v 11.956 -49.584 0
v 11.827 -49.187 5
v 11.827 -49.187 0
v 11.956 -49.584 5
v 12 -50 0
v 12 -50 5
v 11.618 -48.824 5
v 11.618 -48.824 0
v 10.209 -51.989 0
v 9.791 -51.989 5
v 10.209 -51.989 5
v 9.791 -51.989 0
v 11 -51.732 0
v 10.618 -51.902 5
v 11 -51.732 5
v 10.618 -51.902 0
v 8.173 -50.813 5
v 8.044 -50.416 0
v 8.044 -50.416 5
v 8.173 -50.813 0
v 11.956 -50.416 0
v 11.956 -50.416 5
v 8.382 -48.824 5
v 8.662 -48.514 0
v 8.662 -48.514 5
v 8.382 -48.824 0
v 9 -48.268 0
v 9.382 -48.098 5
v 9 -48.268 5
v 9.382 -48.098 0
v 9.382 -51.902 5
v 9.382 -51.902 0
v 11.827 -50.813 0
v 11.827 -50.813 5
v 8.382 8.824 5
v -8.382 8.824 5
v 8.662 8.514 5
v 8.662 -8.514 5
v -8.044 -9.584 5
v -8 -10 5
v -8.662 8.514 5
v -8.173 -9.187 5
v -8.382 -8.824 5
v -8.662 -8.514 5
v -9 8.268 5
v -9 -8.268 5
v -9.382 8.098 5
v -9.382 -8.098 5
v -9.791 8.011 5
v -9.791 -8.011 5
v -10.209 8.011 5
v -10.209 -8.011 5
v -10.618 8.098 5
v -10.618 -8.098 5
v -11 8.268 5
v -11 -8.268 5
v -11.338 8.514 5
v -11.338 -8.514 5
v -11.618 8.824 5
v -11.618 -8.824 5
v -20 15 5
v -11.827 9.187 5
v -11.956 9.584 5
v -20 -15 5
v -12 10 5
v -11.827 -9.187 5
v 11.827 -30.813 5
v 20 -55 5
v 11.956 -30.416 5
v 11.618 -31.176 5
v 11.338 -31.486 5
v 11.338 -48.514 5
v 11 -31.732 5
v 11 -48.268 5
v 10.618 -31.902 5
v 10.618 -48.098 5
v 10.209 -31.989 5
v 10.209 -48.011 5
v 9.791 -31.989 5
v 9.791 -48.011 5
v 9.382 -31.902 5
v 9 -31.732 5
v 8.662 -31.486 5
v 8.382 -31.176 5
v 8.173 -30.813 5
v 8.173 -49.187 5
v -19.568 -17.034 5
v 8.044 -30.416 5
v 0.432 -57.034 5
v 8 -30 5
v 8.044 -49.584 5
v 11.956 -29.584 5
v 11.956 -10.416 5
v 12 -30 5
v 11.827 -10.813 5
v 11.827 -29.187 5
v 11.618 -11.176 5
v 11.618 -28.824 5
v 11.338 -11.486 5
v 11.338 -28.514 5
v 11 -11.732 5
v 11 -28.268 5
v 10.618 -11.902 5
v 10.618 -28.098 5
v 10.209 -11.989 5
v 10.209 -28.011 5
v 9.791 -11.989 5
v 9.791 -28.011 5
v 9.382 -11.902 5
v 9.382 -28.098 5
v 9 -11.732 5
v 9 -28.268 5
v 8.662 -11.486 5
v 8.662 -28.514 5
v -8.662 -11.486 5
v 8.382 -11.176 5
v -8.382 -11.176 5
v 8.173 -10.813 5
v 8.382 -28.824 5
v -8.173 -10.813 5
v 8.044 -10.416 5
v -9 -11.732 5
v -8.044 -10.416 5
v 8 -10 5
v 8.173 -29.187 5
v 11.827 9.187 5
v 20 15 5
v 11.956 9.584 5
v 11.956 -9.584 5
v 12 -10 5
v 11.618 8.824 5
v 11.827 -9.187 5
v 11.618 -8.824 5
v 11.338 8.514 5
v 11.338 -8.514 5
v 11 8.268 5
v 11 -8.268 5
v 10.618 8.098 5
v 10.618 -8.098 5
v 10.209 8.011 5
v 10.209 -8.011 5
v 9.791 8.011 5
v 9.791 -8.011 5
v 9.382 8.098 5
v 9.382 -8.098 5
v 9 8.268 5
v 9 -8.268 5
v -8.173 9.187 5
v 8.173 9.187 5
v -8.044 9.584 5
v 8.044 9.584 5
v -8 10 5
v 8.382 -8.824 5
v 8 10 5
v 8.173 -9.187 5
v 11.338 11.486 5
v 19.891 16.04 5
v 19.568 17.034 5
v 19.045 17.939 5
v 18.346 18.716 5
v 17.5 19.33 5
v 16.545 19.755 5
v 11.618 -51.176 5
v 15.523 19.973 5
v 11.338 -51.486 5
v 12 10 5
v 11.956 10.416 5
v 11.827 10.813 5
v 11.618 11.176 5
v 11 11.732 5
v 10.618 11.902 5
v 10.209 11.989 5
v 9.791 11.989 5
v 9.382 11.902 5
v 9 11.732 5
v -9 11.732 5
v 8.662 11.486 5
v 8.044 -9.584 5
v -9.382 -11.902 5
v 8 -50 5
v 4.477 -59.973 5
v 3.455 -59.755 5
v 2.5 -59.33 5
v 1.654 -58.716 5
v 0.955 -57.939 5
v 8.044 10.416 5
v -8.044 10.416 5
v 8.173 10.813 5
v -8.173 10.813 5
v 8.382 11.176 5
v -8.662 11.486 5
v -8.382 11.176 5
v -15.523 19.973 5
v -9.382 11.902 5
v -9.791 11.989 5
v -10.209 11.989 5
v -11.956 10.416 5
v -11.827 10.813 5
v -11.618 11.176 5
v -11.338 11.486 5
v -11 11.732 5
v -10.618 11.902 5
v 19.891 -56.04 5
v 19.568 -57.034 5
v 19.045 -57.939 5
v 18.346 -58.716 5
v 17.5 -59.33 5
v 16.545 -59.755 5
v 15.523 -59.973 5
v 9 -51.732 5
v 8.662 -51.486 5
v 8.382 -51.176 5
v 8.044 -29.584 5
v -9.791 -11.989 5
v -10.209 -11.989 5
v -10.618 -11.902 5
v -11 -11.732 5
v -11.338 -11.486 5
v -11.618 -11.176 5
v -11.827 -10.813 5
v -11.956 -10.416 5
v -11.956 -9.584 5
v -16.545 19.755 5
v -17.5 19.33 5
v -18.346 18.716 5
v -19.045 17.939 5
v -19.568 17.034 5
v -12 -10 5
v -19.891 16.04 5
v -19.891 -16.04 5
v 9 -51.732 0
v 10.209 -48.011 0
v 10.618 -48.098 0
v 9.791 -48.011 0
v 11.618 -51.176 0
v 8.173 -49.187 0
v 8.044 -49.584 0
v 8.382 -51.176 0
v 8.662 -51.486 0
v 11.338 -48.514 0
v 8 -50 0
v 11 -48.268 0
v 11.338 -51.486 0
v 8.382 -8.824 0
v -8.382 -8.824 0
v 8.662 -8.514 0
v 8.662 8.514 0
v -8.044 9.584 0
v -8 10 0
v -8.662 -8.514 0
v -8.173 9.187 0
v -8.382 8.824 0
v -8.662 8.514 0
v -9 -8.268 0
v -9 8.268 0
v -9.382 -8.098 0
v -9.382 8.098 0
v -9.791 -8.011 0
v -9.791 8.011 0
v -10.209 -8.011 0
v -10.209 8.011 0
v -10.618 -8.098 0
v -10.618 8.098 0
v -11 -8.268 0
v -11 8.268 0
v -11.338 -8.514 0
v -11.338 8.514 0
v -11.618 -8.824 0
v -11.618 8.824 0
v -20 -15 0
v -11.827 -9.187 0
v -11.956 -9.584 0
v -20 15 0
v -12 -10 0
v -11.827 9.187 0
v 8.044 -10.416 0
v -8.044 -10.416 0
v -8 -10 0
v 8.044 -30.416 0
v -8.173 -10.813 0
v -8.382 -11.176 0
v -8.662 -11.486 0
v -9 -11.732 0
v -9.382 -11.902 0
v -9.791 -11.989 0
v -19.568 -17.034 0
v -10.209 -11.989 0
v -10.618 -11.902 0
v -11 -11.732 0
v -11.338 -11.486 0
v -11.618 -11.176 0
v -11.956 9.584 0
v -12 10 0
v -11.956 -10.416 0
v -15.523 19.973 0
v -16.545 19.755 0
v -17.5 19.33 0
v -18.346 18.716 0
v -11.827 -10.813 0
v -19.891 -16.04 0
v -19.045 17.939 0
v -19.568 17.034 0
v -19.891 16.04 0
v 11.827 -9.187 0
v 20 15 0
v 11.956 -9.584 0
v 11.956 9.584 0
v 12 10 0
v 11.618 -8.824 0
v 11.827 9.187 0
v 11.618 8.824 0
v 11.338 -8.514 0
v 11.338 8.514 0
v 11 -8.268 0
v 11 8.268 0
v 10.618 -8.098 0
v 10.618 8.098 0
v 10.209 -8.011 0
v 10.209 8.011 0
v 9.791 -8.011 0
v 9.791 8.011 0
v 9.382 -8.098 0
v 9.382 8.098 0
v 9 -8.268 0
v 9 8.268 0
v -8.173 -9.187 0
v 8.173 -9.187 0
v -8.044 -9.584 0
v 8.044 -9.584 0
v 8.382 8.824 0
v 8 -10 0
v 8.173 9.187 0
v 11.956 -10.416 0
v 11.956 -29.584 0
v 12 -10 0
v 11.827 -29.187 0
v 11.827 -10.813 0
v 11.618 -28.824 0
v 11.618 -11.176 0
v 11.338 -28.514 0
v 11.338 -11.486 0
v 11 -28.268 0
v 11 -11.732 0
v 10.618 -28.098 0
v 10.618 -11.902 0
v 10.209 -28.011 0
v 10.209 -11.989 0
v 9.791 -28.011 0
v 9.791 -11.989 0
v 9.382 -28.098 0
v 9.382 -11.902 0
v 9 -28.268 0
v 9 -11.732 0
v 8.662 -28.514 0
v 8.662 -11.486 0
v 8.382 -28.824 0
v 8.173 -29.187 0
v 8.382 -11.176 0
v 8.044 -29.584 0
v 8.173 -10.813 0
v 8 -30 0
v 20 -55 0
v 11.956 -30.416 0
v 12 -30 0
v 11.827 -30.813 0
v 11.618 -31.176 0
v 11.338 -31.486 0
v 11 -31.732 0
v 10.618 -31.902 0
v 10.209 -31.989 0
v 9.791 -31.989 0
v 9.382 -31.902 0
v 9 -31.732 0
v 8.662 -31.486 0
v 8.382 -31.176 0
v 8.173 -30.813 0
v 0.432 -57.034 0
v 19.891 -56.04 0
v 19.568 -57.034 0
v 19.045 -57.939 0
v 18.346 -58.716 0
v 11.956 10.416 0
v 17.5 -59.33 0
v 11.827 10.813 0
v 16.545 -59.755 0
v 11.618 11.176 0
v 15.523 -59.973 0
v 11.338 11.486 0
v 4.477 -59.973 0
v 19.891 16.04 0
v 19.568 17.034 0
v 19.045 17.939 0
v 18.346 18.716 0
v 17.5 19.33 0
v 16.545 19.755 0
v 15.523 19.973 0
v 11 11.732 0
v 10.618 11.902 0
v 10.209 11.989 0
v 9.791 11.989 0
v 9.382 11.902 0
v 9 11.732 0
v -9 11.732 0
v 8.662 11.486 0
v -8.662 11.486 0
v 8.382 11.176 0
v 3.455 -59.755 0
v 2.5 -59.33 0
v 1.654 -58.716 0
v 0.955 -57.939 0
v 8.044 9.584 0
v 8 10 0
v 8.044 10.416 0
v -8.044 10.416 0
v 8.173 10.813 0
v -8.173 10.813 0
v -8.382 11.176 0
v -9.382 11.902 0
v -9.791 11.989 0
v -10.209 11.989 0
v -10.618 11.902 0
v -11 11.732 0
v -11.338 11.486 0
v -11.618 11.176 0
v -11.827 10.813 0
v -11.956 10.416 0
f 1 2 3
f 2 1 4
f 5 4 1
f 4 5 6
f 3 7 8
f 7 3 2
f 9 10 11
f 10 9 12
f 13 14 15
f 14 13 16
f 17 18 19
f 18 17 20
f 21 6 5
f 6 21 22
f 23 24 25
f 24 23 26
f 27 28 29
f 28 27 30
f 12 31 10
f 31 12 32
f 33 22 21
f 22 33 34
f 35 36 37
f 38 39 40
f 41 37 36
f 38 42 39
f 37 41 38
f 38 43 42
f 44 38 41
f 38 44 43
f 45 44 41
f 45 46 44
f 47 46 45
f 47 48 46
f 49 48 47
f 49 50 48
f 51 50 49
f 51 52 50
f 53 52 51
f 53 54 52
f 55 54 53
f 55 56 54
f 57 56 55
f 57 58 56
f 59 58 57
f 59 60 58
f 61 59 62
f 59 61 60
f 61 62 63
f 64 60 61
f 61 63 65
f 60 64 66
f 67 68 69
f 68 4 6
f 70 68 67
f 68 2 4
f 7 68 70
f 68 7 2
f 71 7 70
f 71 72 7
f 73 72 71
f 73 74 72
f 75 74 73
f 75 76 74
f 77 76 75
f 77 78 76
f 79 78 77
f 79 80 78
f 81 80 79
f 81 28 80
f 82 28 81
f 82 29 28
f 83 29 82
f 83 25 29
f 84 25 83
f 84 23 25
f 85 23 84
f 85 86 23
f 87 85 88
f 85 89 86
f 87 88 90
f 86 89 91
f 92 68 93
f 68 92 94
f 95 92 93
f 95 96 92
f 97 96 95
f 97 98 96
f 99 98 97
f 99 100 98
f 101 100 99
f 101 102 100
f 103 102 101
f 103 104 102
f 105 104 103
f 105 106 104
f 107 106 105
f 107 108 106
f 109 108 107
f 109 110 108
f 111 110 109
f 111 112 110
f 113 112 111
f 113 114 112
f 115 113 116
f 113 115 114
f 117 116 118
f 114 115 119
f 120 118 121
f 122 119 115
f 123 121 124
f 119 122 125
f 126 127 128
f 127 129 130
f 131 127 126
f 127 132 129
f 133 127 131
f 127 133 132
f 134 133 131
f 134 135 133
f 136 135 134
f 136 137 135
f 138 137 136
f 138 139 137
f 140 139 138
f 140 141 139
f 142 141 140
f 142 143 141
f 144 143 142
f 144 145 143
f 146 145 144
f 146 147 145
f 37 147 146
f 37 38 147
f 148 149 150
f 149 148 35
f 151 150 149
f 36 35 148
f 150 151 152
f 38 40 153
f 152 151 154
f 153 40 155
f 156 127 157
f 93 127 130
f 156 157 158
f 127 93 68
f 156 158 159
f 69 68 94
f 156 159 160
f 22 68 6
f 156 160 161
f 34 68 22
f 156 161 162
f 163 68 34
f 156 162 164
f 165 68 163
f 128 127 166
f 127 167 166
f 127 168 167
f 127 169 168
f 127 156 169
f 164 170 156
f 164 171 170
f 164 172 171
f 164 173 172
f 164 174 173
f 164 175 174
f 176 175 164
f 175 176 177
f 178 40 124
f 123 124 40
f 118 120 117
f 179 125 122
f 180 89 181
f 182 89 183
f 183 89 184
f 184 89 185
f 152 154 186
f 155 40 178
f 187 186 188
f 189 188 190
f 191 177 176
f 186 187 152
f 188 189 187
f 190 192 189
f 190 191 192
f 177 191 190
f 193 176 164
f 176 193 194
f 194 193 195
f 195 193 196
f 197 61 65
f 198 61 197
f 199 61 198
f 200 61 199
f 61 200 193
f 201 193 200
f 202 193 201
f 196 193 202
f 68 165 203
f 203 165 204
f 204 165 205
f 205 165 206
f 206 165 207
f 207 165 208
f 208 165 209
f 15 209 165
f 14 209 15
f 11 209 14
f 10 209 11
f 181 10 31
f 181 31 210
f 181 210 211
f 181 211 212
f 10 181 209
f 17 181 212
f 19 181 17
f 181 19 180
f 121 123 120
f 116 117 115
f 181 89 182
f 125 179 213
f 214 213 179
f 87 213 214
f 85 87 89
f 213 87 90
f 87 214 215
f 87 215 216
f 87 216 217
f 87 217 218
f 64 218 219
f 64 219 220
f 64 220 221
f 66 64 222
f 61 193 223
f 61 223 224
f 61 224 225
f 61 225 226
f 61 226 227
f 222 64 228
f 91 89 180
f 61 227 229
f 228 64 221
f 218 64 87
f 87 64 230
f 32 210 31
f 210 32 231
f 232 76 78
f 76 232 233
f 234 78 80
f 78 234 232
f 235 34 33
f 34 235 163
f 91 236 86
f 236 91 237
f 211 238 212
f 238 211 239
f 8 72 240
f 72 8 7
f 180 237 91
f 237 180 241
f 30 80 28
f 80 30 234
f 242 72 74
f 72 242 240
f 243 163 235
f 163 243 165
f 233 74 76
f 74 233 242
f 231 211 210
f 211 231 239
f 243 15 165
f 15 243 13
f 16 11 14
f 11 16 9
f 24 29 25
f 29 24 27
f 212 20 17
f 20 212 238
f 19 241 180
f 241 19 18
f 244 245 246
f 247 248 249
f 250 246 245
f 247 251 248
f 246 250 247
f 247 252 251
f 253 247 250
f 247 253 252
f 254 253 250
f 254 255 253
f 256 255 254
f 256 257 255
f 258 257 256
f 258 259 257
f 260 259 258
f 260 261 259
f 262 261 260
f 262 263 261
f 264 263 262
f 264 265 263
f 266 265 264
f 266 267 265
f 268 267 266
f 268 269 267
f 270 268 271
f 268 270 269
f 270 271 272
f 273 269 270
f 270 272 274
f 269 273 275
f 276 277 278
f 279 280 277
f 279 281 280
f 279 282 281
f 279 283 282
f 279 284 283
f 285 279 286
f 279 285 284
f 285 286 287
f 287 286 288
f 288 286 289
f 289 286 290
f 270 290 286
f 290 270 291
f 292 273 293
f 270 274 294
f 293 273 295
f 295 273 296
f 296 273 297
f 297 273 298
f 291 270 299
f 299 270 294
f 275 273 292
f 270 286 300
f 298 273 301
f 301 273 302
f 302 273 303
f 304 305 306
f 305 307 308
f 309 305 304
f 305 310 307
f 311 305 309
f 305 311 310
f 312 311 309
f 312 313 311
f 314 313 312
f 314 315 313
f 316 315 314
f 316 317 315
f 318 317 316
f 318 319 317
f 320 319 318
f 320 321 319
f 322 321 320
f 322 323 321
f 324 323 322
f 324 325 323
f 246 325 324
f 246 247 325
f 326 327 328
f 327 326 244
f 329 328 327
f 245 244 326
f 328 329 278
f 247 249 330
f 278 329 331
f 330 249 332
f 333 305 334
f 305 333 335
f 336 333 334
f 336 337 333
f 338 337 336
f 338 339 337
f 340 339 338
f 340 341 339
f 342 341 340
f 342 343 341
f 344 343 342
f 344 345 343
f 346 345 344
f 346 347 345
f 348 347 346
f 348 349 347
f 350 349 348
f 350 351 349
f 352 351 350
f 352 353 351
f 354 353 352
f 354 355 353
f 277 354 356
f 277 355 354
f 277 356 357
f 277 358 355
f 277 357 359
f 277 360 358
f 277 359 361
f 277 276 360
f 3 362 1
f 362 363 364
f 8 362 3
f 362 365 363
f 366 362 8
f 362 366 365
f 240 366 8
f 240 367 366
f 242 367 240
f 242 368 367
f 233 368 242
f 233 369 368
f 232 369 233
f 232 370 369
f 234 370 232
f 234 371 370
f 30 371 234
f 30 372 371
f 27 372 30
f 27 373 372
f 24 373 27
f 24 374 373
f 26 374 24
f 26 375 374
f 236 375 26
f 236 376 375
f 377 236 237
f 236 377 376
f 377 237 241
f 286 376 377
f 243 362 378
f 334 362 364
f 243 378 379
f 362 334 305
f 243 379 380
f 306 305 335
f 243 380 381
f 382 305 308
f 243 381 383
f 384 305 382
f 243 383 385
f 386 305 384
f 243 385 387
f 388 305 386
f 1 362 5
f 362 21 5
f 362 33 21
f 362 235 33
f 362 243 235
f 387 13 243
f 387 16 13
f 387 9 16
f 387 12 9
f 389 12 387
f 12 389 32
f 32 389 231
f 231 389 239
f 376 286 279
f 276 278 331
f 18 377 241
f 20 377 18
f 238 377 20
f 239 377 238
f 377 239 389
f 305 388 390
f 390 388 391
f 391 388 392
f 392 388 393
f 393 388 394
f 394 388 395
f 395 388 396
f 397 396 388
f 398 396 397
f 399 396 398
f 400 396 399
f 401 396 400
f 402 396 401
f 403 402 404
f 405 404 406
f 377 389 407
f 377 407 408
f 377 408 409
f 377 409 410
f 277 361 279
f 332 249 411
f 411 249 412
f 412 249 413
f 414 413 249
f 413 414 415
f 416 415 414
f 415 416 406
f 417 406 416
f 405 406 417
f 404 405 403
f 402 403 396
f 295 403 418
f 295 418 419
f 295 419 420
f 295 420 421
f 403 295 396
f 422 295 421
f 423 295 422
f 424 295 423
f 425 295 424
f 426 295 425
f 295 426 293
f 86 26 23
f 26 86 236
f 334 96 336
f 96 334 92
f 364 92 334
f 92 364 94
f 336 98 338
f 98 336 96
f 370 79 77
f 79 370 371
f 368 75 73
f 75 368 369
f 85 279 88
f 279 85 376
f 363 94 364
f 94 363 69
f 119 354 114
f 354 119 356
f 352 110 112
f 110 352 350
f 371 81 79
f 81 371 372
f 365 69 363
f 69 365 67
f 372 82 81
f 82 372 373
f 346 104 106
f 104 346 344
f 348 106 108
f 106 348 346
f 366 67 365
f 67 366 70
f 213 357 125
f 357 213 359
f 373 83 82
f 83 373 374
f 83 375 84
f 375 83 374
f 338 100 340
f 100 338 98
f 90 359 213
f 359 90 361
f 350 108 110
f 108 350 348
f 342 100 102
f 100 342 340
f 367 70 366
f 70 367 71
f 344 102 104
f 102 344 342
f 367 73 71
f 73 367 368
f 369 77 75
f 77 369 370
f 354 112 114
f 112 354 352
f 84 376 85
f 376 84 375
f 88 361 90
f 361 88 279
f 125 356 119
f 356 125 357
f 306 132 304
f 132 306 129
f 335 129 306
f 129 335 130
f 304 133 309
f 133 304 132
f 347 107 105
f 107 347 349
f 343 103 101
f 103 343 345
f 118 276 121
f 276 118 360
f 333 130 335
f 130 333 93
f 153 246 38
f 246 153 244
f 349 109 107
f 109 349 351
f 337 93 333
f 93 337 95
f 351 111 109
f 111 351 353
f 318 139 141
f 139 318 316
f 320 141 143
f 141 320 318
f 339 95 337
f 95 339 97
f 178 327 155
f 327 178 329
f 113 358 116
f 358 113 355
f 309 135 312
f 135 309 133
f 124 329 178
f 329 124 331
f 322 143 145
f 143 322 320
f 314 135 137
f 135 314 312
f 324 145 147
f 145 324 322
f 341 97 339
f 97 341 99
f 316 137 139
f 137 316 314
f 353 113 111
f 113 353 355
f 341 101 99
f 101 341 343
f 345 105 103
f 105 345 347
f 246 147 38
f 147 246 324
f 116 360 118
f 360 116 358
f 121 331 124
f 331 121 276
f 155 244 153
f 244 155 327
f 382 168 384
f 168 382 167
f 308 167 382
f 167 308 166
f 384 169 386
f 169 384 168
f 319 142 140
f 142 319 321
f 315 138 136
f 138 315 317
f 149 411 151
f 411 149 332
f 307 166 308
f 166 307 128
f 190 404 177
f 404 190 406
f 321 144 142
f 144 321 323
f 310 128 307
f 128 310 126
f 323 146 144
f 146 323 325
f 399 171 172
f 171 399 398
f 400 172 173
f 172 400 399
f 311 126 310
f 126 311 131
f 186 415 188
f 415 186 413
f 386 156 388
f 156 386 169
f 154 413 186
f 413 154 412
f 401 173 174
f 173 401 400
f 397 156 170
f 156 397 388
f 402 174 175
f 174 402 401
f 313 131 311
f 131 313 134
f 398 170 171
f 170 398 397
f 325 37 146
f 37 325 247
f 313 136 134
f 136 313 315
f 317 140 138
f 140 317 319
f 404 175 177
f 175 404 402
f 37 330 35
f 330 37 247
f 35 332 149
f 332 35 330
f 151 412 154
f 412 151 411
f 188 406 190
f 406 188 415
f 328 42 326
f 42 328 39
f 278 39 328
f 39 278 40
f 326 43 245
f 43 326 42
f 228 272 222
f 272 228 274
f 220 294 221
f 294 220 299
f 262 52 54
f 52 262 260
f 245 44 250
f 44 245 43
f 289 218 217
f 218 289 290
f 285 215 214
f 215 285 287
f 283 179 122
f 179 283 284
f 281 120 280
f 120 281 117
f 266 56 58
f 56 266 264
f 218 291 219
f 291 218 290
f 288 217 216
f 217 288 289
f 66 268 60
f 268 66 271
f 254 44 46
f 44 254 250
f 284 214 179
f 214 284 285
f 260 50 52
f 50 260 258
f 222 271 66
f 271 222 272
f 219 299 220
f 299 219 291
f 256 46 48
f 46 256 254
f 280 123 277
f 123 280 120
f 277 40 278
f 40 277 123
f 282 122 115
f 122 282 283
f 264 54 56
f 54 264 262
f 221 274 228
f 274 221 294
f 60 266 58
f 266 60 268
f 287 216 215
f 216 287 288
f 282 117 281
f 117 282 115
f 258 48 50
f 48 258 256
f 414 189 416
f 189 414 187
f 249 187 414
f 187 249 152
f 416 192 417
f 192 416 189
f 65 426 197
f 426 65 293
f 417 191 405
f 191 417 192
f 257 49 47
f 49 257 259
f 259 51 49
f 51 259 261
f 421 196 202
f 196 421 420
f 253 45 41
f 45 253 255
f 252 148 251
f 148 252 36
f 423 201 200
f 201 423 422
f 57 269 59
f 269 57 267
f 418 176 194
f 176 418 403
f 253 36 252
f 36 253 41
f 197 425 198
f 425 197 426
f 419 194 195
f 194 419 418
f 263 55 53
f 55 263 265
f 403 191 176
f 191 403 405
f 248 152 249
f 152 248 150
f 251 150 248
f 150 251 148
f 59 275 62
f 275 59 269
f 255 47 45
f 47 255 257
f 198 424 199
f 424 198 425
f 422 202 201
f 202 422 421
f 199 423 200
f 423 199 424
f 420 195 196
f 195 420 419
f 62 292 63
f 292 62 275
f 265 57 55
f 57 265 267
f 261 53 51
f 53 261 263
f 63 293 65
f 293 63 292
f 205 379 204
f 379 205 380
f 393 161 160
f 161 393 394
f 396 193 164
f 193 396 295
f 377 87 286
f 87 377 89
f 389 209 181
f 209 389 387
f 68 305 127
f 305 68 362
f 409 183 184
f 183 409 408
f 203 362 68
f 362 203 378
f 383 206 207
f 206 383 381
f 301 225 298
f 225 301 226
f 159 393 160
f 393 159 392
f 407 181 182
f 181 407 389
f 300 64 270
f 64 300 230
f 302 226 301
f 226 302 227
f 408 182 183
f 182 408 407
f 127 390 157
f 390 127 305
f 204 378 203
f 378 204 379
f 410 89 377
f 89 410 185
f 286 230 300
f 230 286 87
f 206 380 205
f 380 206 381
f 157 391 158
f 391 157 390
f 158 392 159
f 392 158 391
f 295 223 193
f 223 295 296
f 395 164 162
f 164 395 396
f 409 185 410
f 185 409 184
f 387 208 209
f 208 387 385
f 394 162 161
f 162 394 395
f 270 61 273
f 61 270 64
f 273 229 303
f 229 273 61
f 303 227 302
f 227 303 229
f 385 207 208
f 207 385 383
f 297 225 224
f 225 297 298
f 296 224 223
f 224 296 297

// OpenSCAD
TOP_WIDTH = 40;
BOT_WIDTH = 20;
HEIGHT = 80;
THICKNESS = 5;
CORNER_DIA = 10;

MOUNT_DIA = 4;
MOUNT_HEIGHT = 20;
MOUNT_WIDTH = 20;

$fn = 30;

module rounded_cube(width, height, thickness, corner_dia) {
    hull() {
        for(i = [-1, 1]) {
            for(j = [-1, 1]) {
                translate([i * (width - corner_dia)/2, j * (height - corner_dia)/2, 0])
                cylinder(d = corner_dia, h = thickness);
            }
        }
    }
}

module plate() {
    hull() {
        rounded_cube(TOP_WIDTH, TOP_WIDTH, THICKNESS, CORNER_DIA);
        translate([BOT_WIDTH/2, -(HEIGHT - 1.5*BOT_WIDTH), 0])
        rounded_cube(BOT_WIDTH, BOT_WIDTH, THICKNESS, CORNER_DIA);
    }
}

module mount_neg() {
    union() {
        for(j = [-5, -3, -1, 1]) {
            translate([MOUNT_WIDTH/2, j * MOUNT_HEIGHT/2, 0])
            cylinder(d = MOUNT_DIA, h = THICKNESS);
        }
        for(j = [-1, 1]) {
            translate([-MOUNT_WIDTH/2, j * MOUNT_HEIGHT/2, 0])
            cylinder(d = MOUNT_DIA, h = THICKNESS);
        }
    }
}

difference() {
    plate();
    mount_neg();
}
